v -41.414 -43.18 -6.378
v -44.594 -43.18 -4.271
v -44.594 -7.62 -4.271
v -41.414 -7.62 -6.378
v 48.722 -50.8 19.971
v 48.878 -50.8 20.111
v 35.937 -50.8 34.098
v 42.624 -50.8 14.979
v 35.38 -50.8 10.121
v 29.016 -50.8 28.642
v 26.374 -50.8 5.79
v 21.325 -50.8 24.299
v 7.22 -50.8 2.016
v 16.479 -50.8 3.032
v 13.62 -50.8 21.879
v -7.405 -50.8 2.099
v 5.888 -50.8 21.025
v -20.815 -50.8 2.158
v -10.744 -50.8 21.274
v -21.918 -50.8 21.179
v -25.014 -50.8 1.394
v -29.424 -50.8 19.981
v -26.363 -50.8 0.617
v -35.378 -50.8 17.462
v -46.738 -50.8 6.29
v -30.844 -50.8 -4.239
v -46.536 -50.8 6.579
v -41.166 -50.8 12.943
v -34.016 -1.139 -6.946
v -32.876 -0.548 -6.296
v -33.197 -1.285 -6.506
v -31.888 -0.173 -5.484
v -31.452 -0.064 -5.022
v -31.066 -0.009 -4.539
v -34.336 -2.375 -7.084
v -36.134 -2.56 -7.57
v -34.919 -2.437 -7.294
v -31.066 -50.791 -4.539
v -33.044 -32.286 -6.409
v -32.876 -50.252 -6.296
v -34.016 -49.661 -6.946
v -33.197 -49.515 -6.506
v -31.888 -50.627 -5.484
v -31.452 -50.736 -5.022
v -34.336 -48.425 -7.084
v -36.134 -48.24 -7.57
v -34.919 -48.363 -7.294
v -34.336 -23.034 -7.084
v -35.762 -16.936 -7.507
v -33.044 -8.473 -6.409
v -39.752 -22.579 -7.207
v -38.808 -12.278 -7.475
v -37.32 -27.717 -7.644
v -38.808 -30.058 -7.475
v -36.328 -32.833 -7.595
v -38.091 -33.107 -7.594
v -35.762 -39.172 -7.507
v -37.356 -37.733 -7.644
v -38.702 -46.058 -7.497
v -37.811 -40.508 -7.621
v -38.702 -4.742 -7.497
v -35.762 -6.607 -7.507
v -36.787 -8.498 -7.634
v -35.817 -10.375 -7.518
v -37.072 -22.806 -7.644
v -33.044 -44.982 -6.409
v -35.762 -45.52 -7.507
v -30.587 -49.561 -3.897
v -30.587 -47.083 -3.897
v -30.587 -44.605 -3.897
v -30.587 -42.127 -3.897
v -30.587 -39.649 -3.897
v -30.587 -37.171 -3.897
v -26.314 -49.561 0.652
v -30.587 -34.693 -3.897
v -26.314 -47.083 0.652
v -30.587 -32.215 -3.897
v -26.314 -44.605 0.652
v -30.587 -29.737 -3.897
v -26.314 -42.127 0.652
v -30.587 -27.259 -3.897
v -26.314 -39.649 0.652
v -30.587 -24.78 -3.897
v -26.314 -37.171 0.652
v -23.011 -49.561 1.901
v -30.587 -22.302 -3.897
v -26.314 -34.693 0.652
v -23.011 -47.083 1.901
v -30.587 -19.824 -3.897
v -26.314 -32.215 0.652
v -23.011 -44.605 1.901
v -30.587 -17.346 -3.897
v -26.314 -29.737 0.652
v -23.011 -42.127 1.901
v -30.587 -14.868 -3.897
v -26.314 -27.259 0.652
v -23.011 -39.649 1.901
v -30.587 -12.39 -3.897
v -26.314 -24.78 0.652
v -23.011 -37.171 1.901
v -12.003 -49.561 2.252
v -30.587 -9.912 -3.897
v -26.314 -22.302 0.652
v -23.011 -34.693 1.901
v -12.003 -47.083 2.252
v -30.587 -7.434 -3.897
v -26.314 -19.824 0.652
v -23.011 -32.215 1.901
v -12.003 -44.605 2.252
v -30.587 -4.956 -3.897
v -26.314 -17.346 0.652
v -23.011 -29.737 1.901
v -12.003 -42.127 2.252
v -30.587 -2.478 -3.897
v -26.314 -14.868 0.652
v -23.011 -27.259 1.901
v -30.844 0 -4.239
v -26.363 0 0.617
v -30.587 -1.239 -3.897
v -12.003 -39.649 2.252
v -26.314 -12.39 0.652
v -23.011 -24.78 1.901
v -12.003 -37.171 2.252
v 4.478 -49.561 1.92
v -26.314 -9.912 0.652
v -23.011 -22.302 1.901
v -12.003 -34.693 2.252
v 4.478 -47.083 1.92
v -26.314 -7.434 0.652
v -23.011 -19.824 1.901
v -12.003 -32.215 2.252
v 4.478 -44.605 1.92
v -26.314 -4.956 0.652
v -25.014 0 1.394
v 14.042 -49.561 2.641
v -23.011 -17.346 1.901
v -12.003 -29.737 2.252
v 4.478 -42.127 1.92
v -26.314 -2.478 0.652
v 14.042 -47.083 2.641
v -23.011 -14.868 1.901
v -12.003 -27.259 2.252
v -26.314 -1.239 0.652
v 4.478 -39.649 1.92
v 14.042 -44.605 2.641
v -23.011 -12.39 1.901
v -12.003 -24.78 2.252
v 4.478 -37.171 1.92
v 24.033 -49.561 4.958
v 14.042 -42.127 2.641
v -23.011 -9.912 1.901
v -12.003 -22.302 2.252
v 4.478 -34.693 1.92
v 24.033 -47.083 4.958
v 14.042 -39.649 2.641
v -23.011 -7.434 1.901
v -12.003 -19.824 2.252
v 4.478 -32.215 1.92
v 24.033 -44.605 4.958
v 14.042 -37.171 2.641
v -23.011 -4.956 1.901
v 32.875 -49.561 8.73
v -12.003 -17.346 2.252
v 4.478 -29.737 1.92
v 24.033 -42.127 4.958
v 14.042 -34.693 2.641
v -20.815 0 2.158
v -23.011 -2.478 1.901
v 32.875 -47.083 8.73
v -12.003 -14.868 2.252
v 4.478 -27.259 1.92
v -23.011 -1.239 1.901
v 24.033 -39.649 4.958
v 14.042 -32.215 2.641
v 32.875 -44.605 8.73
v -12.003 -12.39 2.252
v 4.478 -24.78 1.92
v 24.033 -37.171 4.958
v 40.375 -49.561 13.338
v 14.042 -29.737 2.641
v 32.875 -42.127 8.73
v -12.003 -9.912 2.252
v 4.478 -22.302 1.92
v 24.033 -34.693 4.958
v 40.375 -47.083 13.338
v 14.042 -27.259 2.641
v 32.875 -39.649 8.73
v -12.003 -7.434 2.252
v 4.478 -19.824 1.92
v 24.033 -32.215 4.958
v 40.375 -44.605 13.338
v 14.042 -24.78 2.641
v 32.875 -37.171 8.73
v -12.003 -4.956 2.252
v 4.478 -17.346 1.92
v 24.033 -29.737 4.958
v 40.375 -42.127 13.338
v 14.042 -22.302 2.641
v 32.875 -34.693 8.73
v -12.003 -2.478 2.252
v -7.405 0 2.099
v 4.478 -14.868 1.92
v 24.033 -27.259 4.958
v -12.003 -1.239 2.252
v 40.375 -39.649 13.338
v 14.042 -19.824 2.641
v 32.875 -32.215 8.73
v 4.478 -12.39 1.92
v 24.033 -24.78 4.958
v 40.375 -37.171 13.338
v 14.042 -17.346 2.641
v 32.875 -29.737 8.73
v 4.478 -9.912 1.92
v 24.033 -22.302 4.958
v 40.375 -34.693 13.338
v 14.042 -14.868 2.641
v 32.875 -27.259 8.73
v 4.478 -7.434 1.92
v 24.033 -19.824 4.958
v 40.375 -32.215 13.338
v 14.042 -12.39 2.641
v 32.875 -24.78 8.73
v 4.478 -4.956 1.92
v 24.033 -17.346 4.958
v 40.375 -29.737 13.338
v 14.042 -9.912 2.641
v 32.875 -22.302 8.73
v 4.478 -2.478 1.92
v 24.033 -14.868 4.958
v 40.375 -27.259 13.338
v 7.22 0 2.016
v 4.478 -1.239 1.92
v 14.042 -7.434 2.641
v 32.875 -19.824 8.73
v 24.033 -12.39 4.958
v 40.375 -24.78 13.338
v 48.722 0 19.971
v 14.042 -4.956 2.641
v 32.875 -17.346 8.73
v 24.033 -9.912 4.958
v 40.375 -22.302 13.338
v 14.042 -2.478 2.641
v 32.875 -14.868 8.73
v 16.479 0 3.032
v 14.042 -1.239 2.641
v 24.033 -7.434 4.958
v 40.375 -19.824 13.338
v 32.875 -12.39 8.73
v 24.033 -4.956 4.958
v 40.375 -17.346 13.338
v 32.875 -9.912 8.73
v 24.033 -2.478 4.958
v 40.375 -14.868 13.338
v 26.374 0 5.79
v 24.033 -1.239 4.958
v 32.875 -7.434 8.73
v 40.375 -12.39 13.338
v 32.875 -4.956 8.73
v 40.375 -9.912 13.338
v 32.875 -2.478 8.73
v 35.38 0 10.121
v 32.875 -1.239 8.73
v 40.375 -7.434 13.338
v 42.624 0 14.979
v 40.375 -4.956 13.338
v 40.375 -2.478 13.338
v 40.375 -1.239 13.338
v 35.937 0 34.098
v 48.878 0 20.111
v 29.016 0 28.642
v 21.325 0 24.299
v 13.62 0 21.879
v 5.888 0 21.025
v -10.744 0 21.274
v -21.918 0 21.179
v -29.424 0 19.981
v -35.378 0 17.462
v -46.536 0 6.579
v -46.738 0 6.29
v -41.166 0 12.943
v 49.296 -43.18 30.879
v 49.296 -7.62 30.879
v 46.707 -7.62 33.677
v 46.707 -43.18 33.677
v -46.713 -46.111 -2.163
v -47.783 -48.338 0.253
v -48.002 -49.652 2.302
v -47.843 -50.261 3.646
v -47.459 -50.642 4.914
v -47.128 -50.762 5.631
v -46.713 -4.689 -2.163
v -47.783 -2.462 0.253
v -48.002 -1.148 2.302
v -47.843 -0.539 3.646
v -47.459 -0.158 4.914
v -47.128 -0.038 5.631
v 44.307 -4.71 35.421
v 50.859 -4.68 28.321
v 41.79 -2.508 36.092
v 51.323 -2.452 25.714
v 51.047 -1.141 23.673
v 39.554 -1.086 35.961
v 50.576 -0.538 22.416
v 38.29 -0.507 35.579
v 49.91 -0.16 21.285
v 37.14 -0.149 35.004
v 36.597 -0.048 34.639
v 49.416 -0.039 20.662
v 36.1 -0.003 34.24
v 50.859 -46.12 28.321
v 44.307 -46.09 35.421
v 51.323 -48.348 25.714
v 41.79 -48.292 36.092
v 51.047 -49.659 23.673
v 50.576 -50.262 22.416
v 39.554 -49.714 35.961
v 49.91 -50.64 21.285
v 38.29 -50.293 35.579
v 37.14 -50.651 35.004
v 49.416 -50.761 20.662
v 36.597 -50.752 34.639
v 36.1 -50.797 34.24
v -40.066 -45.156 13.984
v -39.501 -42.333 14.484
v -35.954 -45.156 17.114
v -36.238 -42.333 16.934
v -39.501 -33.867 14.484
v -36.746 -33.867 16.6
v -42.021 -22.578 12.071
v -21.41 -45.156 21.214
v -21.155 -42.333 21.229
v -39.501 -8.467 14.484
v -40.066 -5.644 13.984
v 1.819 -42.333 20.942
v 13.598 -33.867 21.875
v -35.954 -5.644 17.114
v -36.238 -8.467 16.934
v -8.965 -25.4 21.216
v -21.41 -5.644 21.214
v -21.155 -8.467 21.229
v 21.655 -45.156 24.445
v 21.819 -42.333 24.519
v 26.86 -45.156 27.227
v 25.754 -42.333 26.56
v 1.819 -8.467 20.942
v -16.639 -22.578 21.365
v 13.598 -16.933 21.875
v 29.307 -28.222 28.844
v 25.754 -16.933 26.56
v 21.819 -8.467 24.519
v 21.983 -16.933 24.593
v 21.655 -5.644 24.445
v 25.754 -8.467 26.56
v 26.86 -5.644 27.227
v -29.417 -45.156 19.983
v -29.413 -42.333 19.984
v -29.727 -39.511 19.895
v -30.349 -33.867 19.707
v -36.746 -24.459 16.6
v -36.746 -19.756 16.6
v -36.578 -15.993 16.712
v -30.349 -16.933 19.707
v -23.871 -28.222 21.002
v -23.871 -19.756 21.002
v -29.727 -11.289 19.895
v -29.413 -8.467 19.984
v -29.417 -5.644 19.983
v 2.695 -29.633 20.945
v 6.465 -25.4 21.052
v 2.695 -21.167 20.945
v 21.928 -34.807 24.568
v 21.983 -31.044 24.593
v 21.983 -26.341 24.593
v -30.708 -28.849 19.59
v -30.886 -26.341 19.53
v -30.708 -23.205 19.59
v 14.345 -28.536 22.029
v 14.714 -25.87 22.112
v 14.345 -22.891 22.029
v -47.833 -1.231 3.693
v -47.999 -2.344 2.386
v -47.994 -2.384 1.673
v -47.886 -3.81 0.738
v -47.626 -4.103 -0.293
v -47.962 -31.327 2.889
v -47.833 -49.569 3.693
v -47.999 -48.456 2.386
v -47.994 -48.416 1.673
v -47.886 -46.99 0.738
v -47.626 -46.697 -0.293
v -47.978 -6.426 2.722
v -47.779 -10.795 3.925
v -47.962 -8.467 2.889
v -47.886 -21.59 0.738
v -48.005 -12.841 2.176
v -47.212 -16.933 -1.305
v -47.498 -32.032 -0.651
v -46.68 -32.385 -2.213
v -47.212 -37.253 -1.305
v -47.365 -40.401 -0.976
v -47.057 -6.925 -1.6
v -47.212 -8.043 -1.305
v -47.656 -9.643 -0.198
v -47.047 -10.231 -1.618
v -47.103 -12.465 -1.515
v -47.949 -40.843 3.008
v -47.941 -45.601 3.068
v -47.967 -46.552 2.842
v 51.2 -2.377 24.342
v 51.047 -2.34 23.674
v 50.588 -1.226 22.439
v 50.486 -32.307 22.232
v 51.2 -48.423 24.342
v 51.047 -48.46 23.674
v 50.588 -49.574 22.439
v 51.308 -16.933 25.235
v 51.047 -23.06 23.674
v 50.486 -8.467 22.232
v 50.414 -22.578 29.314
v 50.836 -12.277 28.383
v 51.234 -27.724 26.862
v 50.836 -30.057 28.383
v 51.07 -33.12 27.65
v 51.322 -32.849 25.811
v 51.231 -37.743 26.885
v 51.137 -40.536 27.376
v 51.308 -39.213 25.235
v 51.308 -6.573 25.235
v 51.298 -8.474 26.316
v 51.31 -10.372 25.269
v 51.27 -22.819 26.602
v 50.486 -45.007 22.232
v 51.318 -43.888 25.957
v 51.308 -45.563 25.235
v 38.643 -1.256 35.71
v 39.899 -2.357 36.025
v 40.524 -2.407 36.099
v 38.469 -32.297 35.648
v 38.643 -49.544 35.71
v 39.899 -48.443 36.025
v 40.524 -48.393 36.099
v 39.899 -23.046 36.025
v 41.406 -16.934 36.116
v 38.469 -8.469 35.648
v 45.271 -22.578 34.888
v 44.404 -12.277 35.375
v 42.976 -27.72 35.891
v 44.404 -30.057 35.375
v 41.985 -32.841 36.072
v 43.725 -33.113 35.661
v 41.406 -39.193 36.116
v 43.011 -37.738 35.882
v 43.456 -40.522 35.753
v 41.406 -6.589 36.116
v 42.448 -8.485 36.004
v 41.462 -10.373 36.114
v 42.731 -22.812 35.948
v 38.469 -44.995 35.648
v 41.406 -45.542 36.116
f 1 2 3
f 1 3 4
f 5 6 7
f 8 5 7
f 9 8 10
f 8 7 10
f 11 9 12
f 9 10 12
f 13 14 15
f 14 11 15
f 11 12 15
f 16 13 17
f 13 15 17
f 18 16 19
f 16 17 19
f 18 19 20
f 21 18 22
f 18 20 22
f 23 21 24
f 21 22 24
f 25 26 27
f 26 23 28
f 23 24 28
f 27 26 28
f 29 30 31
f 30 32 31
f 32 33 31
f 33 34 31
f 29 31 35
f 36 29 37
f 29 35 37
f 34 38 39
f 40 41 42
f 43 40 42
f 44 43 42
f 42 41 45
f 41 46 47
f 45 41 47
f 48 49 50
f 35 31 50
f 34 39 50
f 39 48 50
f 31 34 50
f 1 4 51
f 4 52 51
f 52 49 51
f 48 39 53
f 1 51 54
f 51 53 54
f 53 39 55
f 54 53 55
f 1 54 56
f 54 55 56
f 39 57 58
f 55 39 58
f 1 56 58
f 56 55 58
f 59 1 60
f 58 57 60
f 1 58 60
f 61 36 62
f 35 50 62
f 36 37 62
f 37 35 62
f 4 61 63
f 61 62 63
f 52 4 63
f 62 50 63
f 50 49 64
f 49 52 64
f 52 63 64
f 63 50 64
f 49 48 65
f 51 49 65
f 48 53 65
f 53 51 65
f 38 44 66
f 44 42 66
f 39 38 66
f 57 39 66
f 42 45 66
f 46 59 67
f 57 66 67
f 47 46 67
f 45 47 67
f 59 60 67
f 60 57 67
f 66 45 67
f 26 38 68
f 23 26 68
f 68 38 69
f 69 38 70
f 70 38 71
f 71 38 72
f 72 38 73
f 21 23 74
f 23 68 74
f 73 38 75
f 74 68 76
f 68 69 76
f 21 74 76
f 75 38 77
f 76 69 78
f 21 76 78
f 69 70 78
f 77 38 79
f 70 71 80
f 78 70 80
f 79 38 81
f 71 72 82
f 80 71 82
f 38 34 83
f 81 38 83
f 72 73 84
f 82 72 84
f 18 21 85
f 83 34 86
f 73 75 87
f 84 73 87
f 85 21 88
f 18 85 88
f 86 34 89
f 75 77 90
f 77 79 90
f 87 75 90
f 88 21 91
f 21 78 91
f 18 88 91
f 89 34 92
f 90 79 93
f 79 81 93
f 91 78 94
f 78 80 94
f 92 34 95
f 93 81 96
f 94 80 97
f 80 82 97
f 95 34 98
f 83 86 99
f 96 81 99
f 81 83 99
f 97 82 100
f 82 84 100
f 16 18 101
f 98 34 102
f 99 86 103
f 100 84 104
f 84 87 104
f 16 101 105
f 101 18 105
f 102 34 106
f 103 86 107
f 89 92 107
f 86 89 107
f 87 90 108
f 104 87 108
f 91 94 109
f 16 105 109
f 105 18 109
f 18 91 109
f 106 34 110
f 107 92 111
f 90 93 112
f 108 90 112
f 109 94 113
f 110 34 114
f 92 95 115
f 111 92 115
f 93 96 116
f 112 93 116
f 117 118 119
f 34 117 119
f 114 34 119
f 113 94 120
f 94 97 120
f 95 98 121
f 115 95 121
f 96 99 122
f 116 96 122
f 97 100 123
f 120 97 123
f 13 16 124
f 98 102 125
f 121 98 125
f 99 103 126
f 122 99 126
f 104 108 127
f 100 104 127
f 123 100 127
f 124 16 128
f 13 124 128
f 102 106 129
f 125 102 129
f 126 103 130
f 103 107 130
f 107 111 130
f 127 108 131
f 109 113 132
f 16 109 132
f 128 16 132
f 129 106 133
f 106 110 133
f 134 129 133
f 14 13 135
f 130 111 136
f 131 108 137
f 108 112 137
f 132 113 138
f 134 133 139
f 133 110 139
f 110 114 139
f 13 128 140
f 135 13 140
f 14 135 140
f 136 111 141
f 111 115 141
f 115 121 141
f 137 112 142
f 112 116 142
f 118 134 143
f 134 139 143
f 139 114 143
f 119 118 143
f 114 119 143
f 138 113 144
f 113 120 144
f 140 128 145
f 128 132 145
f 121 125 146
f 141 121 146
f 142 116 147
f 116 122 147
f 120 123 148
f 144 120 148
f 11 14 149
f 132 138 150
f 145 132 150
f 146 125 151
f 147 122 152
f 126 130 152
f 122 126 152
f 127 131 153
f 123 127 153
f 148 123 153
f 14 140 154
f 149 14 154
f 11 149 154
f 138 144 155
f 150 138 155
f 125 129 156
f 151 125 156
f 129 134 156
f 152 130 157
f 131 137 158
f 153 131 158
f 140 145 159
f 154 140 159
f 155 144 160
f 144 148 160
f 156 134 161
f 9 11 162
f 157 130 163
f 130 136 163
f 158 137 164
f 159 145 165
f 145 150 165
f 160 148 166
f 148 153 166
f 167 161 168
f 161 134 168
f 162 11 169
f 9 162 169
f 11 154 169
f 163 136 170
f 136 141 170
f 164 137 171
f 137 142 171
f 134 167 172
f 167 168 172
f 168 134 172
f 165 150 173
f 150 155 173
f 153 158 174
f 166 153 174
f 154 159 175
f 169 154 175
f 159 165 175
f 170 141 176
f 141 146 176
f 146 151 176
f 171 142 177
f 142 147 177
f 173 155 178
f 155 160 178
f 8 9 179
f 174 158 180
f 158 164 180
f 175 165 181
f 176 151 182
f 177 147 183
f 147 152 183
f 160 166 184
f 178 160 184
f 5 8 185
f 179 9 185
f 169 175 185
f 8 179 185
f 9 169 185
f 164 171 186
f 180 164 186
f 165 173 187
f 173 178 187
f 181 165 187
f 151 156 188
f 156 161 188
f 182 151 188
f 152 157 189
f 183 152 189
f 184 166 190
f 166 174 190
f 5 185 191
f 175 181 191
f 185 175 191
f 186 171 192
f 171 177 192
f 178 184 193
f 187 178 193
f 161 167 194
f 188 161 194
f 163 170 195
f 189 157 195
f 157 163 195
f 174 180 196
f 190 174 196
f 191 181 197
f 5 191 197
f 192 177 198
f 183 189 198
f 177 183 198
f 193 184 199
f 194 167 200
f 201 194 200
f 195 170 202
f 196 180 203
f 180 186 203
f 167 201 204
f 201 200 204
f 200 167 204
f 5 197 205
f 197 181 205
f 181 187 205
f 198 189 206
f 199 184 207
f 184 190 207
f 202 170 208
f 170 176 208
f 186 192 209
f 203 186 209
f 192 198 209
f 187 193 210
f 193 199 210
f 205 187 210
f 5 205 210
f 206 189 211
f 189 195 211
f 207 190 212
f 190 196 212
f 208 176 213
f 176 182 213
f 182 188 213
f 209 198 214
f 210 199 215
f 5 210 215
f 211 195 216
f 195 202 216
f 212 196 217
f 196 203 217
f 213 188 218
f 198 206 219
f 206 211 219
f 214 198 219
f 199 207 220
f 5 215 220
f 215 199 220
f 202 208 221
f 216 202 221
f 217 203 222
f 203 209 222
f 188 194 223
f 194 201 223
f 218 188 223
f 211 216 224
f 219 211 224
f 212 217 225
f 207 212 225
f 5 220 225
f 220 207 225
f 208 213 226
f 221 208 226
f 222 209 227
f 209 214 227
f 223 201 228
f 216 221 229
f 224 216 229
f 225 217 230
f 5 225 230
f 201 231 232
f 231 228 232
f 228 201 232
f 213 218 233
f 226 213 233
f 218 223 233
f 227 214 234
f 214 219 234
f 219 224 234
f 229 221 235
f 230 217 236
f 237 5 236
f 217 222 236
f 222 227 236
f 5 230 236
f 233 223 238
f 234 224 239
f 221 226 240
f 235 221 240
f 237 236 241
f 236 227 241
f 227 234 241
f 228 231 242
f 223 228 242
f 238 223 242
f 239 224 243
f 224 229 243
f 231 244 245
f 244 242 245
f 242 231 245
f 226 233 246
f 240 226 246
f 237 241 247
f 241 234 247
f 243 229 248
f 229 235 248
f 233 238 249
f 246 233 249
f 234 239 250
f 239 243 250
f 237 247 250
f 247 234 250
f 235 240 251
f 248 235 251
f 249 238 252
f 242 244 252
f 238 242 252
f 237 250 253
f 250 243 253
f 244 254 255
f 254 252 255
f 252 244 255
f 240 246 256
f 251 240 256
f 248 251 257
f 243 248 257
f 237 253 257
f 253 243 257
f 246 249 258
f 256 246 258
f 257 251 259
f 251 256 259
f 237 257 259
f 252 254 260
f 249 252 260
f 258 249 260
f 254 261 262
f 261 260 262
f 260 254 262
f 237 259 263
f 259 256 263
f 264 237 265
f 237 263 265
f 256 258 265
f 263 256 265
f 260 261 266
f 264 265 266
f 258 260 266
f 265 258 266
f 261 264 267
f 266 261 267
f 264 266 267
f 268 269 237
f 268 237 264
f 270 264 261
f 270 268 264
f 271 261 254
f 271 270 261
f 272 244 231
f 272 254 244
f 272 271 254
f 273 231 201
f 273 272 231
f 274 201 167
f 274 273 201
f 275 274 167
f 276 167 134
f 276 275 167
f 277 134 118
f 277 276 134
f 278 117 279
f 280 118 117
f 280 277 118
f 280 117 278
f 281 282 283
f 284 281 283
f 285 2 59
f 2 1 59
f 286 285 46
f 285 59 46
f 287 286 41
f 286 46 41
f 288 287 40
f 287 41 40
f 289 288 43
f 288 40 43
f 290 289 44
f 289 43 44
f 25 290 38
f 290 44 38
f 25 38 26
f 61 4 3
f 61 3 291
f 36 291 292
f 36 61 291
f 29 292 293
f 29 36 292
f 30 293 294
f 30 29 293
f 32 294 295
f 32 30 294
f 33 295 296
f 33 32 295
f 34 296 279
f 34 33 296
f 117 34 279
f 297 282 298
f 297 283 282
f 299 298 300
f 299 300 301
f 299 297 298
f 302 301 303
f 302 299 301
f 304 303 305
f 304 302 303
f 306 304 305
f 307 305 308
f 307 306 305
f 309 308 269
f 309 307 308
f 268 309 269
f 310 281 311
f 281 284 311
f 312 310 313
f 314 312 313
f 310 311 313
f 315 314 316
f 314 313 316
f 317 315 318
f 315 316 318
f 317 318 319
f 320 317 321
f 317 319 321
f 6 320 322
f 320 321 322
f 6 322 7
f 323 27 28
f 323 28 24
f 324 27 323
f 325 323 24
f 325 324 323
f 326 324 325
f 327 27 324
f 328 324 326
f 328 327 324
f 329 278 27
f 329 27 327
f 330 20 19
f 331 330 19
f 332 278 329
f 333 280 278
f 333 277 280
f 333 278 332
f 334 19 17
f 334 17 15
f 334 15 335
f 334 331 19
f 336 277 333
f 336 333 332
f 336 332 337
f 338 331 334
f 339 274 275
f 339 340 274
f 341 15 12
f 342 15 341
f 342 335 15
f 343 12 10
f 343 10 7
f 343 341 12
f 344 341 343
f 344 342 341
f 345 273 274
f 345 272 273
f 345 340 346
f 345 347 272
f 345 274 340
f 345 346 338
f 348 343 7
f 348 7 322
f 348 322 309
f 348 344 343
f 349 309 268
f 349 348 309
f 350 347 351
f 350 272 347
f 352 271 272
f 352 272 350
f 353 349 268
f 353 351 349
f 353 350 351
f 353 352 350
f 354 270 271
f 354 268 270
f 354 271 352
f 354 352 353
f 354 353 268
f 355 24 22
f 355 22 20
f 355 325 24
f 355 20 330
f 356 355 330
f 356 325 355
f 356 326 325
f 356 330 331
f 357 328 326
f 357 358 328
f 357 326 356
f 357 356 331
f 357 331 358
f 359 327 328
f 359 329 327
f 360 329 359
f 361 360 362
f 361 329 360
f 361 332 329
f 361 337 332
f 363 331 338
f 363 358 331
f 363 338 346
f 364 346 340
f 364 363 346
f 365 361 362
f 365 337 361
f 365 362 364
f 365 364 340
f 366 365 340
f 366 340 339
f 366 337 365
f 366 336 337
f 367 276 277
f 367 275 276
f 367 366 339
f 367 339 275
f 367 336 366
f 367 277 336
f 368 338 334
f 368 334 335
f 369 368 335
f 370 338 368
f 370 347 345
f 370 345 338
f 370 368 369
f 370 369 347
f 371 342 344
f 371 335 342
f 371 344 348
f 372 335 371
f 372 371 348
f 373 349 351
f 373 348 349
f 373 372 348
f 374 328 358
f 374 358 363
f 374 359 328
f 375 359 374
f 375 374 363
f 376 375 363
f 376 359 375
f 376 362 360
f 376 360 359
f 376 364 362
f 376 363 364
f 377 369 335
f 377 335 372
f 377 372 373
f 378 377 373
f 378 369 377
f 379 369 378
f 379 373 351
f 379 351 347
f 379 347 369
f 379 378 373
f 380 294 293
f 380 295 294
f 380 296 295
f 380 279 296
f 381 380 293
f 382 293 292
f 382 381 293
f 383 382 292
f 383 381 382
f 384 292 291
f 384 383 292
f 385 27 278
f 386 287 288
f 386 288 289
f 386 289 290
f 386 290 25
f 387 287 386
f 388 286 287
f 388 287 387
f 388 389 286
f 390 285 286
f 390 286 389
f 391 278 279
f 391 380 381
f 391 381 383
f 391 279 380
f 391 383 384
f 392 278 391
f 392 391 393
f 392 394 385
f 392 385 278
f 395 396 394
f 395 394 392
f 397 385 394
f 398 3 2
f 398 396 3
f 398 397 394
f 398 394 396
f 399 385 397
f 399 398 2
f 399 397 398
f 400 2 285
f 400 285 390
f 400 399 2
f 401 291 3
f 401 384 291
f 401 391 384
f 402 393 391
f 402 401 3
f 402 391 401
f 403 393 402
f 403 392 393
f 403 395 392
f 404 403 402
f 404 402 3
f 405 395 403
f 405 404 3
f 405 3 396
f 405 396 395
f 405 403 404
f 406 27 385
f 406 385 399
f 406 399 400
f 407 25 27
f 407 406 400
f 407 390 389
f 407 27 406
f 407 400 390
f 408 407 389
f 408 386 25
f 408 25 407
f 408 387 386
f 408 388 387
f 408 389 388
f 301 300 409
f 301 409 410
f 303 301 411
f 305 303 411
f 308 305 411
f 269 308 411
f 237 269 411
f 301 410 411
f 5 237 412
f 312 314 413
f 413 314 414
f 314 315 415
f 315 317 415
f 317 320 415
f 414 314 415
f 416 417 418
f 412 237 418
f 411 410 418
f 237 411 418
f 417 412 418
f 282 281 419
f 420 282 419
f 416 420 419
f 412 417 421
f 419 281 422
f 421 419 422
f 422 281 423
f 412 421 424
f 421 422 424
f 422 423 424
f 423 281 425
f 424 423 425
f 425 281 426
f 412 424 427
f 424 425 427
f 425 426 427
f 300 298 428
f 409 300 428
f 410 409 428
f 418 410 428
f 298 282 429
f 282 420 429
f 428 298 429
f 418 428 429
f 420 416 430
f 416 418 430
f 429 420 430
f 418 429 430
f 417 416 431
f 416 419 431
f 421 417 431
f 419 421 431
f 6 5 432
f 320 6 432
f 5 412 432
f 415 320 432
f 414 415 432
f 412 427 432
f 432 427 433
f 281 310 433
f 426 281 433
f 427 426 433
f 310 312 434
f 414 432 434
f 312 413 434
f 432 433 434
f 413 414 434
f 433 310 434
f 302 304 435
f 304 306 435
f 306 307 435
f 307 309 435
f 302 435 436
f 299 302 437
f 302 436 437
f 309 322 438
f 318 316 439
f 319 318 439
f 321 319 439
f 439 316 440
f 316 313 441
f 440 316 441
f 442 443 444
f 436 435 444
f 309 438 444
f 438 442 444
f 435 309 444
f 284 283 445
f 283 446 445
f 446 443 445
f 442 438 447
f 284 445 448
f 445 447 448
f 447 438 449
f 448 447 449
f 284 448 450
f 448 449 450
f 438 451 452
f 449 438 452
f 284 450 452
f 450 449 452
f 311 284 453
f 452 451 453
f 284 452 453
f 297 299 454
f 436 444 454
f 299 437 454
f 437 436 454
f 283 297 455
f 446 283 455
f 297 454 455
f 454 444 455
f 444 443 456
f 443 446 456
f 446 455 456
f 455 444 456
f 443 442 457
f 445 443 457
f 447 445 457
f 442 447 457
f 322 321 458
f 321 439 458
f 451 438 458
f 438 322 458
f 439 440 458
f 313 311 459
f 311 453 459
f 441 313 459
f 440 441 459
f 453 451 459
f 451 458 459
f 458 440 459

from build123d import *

# Parameters (mm, degrees)
F1_DEPTH = 50.8
F2_R     = 7.62


# Not quite as in the source:
# - the dataset's text gives a spline's control points without its knots; the knots are read off the source's solid


with BuildPart() as f1:
    # F0 (on Front) → F1 (new body)
    with BuildSketch(Plane.XZ):
        with BuildLine():
            add(Edge.make_bspline(
                [(-51.0408617556, 0), (-45.5275415756, 8.3222117367), (-33.1728131458, 26.9713492051), (15.9381703449, 15.4898879926), (33.4564530938, 31.6988813075), (41.5815524757, 39.2167232931)],
                knots=[0, 0, 0, 0, 0.3017270247, 0.6761362172, 1, 1, 1, 1], degree=3))
            Line((-51.0408617556, 0), (-35.1597019204, -10.5209915069))
            add(Edge.make_bspline(
                [(-35.1597019204, -10.5209915069), (-34.0176679526, -8.7971212834), (-32.4436828955, -6.4289476549), (-30.5673961608, -3.844107074), (-29.2783594821, -2.2206757706), (-28.1224556356, -0.9303565603), (-27.1210118733, 0.0294254181), (-26.427429255, 0.5807963747), (-25.9491520867, 0.9059703006), (-25.6216745244, 1.1026978633), (-25.3148685346, 1.2632261503), (-25.0156656107, 1.3975091183), (-24.7534837721, 1.4958188175), (-24.53491931, 1.5662690462), (-24.3240544361, 1.6271387901), (-24.0660733701, 1.6933193952), (-23.6603436757, 1.7855318353), (-22.791571975, 1.9500019347), (-21.1236299266, 2.157569393), (-18.5454924397, 2.3020094371), (-15.4940252899, 2.3309953909), (-12.0557374475, 2.2624077187), (-8.2992802909, 2.131996953), (-4.2762269139, 1.9869386104), (-0.0220731549, 1.8837160535), (3.6990437901, 1.8878531223), (6.7794439764, 1.9860069299), (9.1424813896, 2.1194163727), (11.5593646659, 2.326335526), (14.0327137076, 2.6230416895), (16.1394099163, 2.959867021), (17.8584301073, 3.295613243), (19.1296511182, 3.5752662629), (20.3839486951, 3.8818598634), (22.0321693162, 4.3253575728), (24.8512388207, 5.1890841749), (28.6793925567, 6.6518174582), (32.9317814942, 8.6951058623), (36.8413517827, 10.9454044623), (40.4245860953, 13.3273576493), (44.8048318302, 16.5921251267), (49.6210716705, 20.6981173805), (52.9512719821, 23.7831411529), (54.5192729081, 25.2339521081)],
                knots=[0, 0, 0, 0, 0.0625, 0.09375, 0.125, 0.15625, 0.1875, 0.21875, 0.234375, 0.25, 0.265625, 0.28125, 0.296875, 0.3046875, 0.3125, 0.3203125, 0.328125, 0.34375, 0.375, 0.40625, 0.4375, 0.46875, 0.5, 0.53125, 0.5625, 0.59375, 0.609375, 0.625, 0.640625, 0.65625, 0.671875, 0.6796875, 0.6875, 0.6953125, 0.703125, 0.71875, 0.75, 0.78125, 0.8125, 0.84375, 0.875, 0.9375, 1, 1, 1, 1], degree=3))
            Line((54.5192729081, 25.2339521081), (41.5815524757, 39.2167232931))
        make_face()
    extrude(amount=F1_DEPTH)

    # F2
    f2_edges = [f1.edges().sort_by_distance(p)[0] for p in [
        (41.581552, -25.4, 39.216723),
        (54.519273, -25.4, 25.233952),
        (48.050413, 0, 32.225338),
        (48.050413, -50.8, 32.225338),
        (-35.159702, -25.4, -10.520992),
        (-51.040862, -25.4, 0),
        (-43.100282, 0, -5.260496),
        (-43.100282, -50.8, -5.260496),
    ]]
    fillet(f2_edges, radius=F2_R)


solid = f1.part
